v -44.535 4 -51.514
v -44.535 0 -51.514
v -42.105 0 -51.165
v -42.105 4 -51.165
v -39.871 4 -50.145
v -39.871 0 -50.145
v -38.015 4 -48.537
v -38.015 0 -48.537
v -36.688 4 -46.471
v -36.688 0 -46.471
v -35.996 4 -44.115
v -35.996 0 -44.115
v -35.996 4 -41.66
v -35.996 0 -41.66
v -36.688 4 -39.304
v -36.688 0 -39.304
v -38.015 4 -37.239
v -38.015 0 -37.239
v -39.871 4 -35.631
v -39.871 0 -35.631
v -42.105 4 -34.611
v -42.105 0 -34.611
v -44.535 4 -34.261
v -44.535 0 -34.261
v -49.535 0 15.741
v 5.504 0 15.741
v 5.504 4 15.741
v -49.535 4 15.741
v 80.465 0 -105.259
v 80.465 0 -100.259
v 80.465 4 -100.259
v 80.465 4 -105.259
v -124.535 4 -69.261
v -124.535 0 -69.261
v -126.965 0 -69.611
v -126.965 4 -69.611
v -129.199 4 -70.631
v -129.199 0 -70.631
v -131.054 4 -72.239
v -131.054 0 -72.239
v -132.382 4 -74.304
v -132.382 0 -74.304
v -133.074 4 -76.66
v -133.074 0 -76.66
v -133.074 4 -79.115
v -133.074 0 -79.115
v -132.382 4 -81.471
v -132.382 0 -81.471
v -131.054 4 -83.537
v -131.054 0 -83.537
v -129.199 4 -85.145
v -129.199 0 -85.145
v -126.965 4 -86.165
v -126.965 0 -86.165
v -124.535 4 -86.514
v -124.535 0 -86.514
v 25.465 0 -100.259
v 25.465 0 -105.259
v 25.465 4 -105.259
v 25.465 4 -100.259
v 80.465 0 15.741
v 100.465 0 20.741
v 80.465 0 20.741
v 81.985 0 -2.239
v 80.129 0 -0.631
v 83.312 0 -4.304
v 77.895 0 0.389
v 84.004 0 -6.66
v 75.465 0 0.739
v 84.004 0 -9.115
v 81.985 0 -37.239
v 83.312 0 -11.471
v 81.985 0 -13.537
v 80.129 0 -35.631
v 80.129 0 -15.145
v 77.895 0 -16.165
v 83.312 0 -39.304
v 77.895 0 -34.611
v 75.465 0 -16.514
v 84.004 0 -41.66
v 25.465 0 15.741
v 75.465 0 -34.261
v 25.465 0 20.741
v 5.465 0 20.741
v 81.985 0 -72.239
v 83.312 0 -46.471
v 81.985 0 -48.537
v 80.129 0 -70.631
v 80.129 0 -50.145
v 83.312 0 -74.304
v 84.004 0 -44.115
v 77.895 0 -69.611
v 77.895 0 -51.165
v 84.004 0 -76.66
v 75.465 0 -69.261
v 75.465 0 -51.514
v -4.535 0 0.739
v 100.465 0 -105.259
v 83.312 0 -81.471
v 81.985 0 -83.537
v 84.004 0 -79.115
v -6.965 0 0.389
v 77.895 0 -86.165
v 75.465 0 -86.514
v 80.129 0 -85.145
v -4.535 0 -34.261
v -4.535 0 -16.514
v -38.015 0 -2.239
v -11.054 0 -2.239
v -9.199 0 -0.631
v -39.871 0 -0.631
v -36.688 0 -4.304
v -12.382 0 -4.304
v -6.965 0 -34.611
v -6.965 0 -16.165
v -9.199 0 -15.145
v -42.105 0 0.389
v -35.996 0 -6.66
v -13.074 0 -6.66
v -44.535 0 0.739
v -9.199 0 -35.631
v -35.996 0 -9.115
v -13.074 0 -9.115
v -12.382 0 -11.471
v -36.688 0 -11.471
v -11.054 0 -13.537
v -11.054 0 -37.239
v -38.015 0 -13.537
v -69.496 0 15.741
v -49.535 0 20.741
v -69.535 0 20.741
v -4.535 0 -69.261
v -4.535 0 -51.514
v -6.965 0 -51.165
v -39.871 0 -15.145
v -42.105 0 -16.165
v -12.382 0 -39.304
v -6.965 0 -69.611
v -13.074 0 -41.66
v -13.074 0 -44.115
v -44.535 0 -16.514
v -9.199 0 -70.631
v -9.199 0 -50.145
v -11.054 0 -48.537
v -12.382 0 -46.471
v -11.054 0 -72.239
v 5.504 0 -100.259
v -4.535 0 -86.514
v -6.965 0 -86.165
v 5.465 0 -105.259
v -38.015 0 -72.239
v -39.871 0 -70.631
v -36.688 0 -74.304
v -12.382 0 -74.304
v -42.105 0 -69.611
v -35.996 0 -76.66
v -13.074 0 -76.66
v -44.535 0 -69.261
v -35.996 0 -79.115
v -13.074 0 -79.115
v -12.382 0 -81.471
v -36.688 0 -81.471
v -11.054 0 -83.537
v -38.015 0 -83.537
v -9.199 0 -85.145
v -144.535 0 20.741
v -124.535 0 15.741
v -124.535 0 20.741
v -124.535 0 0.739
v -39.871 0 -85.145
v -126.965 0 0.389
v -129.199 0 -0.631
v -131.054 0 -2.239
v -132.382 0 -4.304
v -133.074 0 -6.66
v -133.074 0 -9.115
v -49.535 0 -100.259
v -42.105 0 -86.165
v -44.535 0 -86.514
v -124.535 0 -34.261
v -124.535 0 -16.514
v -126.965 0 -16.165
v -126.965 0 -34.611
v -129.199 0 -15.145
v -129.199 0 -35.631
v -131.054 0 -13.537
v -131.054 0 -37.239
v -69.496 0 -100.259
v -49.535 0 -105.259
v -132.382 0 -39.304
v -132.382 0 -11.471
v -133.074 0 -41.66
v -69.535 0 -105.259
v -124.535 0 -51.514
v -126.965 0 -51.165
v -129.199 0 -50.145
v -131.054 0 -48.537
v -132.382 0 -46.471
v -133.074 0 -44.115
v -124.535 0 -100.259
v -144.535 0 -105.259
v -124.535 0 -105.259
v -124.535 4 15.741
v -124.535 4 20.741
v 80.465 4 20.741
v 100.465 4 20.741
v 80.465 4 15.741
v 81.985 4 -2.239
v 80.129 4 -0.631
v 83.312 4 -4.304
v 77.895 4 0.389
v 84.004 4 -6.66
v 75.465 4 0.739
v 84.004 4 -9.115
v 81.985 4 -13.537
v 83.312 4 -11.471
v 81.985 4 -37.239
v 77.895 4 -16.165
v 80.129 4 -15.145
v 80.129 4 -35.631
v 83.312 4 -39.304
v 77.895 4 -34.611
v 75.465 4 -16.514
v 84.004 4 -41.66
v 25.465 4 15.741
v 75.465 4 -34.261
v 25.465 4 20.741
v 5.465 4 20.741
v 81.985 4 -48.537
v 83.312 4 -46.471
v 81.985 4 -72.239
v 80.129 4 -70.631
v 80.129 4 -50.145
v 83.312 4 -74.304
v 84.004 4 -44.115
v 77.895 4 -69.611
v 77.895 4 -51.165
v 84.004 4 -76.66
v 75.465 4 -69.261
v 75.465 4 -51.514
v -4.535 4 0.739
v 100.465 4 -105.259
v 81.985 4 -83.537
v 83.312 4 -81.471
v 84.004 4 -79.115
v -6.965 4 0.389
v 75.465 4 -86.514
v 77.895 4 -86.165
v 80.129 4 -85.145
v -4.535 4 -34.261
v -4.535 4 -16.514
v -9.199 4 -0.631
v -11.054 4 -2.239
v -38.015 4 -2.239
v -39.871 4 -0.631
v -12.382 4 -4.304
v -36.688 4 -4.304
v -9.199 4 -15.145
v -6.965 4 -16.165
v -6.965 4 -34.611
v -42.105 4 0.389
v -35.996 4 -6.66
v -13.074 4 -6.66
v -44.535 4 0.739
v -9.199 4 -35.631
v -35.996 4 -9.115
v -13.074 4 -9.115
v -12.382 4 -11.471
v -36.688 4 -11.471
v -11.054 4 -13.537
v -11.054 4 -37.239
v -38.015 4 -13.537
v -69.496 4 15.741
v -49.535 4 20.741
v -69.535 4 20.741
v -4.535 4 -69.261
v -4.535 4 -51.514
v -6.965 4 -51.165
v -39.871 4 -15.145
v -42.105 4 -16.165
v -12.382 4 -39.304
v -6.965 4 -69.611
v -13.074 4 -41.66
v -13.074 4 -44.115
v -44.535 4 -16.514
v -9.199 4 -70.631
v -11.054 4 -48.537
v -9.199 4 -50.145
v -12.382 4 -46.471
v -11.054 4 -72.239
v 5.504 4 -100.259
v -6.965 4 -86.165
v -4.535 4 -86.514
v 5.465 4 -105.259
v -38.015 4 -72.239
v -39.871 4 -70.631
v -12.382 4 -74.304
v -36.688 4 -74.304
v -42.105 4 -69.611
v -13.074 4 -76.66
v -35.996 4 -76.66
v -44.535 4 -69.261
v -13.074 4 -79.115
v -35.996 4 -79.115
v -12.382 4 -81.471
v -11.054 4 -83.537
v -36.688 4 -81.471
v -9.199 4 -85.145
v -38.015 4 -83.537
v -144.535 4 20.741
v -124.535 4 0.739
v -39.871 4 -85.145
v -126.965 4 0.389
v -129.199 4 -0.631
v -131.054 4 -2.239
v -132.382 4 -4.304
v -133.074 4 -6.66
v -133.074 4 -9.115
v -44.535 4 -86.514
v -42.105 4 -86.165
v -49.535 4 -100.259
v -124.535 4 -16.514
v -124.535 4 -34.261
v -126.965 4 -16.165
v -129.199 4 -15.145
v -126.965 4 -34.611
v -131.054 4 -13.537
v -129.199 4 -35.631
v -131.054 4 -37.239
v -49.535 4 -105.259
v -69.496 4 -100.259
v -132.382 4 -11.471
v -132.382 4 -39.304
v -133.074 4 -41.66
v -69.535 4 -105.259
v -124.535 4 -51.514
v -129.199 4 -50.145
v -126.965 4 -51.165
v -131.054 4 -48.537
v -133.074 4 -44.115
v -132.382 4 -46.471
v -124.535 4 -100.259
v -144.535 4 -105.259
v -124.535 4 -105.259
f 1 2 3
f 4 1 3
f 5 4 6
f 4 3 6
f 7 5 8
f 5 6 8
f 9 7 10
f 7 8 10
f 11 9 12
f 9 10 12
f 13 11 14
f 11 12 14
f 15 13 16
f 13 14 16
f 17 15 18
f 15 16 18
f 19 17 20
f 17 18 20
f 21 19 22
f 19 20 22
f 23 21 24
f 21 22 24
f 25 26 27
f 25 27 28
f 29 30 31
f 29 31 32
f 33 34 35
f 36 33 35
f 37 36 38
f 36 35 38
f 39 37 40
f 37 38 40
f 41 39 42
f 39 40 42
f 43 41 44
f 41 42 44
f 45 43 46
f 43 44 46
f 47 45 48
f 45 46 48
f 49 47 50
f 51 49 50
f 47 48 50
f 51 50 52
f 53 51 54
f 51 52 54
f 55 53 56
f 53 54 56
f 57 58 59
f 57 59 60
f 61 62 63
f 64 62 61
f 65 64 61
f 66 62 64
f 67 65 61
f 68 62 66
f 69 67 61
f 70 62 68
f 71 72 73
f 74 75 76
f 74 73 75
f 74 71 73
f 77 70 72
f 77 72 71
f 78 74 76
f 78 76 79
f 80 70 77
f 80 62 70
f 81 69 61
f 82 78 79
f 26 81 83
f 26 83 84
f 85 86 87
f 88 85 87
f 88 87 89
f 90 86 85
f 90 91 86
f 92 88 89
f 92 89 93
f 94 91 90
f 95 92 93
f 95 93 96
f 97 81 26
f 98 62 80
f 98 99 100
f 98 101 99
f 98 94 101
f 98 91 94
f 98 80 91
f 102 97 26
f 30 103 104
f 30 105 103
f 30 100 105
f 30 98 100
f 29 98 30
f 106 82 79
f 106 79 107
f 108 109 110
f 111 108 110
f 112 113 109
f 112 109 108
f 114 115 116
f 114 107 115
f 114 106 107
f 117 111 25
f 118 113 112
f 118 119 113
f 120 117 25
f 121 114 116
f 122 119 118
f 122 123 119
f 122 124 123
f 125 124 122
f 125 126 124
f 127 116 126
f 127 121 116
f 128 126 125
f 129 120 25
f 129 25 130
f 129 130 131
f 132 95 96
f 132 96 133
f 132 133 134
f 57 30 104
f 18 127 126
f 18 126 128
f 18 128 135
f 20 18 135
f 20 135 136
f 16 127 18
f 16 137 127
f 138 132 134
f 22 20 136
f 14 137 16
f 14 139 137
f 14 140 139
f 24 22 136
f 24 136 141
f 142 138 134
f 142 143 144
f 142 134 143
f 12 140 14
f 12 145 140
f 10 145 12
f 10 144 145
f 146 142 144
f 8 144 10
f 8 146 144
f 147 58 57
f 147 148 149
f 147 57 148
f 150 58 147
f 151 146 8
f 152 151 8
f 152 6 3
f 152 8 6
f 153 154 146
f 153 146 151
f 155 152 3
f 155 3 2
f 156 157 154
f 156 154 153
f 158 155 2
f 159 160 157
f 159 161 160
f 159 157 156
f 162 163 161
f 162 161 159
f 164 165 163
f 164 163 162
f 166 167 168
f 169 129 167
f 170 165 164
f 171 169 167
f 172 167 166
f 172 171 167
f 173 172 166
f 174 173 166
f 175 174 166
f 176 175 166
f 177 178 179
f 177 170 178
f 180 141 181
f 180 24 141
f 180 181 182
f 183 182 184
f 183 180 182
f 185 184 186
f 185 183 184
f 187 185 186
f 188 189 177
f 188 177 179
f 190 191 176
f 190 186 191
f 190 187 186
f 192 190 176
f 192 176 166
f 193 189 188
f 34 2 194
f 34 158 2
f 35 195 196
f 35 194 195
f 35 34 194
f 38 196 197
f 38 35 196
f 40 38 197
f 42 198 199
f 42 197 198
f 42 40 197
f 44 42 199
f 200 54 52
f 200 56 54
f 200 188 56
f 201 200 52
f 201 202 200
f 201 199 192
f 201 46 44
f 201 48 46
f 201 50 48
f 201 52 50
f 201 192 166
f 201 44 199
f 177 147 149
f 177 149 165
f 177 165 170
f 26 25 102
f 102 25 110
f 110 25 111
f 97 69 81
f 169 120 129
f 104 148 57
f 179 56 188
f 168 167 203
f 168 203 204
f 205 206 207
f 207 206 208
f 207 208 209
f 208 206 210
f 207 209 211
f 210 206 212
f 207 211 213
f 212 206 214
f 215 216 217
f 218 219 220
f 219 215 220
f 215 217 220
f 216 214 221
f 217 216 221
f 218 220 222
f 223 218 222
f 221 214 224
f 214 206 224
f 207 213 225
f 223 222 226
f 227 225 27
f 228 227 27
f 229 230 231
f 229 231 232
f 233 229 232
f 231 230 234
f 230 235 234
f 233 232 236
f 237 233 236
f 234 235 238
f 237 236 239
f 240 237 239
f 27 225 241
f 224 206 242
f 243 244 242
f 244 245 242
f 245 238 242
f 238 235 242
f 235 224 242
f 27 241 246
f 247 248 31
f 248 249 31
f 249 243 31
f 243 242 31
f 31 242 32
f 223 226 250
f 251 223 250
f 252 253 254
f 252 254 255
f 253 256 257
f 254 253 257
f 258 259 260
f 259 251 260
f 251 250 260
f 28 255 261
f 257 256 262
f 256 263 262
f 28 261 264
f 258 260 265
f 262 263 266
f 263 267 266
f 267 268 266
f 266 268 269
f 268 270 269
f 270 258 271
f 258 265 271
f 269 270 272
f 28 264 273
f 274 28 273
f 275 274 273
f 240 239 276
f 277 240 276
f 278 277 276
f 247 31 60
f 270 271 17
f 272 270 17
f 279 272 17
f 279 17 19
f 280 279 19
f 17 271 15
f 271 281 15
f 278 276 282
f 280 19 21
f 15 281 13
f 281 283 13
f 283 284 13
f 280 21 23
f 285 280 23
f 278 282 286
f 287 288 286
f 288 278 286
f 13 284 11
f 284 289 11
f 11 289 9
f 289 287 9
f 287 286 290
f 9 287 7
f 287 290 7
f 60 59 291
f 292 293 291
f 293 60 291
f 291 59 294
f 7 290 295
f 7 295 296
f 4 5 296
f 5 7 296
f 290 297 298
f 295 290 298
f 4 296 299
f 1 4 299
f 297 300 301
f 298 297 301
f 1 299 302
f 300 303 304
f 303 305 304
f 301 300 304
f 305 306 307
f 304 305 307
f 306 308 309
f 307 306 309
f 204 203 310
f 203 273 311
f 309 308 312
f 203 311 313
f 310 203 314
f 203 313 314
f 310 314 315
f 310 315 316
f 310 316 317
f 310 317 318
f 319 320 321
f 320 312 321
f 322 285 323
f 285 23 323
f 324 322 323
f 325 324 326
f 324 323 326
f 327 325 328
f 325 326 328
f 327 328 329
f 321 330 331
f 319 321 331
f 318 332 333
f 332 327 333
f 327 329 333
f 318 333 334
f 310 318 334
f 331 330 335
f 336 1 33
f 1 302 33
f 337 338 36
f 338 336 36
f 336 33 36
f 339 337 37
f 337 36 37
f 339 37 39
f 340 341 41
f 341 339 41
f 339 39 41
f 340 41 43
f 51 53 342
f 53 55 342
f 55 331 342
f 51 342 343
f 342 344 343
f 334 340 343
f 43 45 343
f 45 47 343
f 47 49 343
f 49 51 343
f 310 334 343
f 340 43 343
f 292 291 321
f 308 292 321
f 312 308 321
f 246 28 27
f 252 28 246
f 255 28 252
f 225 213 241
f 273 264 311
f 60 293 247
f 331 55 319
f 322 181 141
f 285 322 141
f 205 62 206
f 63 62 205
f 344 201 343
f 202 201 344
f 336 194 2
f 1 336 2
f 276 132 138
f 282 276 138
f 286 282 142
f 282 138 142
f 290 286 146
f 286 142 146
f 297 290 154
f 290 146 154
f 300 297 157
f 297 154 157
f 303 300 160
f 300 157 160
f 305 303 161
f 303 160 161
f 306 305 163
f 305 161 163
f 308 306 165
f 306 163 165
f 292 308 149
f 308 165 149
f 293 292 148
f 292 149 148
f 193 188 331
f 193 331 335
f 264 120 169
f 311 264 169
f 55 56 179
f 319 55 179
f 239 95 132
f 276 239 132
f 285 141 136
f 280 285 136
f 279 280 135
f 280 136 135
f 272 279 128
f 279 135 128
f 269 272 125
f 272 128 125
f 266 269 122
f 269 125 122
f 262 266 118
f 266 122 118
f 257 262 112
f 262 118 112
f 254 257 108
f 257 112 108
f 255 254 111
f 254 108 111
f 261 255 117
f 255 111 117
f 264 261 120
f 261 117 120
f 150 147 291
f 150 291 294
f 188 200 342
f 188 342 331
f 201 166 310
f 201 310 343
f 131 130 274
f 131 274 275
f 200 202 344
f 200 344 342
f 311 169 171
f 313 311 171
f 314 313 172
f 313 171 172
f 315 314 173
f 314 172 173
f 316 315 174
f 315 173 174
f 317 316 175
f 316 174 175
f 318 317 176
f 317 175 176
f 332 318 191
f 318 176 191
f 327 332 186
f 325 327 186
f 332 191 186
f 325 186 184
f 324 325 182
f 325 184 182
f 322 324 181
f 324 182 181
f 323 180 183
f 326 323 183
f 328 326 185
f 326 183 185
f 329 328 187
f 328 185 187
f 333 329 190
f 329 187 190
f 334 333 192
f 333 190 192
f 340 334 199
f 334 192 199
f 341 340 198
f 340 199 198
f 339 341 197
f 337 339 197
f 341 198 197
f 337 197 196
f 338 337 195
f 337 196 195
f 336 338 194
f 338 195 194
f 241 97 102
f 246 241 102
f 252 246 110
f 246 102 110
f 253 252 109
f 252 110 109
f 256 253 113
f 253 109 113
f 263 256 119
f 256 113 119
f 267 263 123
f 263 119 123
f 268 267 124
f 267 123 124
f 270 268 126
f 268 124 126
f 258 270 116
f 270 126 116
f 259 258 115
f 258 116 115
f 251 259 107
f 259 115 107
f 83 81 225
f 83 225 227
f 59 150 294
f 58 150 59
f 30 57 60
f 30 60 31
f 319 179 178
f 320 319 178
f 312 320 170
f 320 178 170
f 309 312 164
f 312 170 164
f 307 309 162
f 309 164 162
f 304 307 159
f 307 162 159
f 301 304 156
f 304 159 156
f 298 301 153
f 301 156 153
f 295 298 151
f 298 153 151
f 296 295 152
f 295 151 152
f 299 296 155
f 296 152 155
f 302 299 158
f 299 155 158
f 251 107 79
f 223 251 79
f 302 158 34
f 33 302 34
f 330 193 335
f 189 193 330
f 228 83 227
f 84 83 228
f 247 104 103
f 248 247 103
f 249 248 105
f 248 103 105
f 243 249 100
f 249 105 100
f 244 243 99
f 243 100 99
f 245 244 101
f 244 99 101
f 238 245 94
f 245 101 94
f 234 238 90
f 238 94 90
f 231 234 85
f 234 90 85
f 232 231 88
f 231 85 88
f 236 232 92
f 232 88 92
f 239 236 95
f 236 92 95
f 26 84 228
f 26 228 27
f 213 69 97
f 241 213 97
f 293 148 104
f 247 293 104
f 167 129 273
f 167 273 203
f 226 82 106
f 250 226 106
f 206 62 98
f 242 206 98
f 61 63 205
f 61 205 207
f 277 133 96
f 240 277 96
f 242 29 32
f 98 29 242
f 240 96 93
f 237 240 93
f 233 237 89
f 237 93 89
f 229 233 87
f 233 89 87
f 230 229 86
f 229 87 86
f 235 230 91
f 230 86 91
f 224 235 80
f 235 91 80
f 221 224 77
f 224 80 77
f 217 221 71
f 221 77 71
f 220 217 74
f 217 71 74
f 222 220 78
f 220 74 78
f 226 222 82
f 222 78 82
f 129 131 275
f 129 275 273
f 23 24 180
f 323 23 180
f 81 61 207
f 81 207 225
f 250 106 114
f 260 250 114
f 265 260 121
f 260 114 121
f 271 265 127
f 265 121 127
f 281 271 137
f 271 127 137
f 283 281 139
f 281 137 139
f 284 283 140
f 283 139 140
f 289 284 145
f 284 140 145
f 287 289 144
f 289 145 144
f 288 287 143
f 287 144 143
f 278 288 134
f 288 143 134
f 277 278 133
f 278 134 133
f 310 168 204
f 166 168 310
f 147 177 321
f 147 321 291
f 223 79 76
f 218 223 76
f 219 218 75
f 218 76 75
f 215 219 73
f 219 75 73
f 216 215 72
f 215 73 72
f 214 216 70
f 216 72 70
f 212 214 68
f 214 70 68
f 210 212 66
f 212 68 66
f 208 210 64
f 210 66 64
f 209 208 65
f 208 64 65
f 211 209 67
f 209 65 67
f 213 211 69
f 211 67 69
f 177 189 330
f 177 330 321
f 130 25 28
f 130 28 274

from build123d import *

# Parameters (mm, degrees)
BOSS_EXTRUDE1_DEPTH = 4


with BuildPart() as part:
    # Sketch1 → Boss-Extrude1 (new body)
    with BuildSketch(Plane(origin=(0, 0, 0), x_dir=(1, 0, 0), z_dir=(0, 1, 0))):
        Polygon((-69.534910804, 105.258653628), (-49.534910804, 105.258653628), (-49.534910804, 100.258653628), (5.503649635, 100.258653628), (5.465089196, 105.258653628), (25.465089196, 105.258653628), (25.465089196, 100.258653628), (80.465089196, 100.258653628), (80.465089196, 105.258653628), (100.465089196, 105.258653628), (100.465089196, 100.258653628), (100.465089196, -15.741346372), (100.465089196, -20.741346372), (80.465089196, -20.741346372), (80.465089196, -15.741346372), (25.465089196, -15.741346372), (25.465089196, -20.741346372), (5.465089196, -20.741346372), (5.503649635, -15.741346372), (-49.534910804, -15.741346372), (-49.534910804, -20.741346372), (-69.534910804, -20.741346372), (-69.496350365, -15.741346372), (-124.534910804, -15.741346372), (-124.534910804, -20.741346372), (-144.534910804, -20.741346372), (-144.534910804, 105.258653628), (-124.534910804, 105.258653628), (-124.534910804, 100.258653628), (-69.496350365, 100.258653628), align=None)
        with BuildLine():
            Line((-4.534910804, 86.514295241), (75.465089196, 86.514295241))
            ThreePointArc((75.465089196, 86.514295241), (84.091672485, 77.887711952), (75.465089196, 69.261128664))
            Line((75.465089196, 69.261128664), (-4.534910804, 69.261128664))
            ThreePointArc((-4.534910804, 69.261128664), (-13.161494092, 77.887711952), (-4.534910804, 86.514295241))
        make_face(mode=Mode.SUBTRACT)
        with BuildLine():
            Line((-124.534910804, 86.514295241), (-44.534910804, 86.514295241))
            ThreePointArc((-44.534910804, 86.514295241), (-35.908327515, 77.887711952), (-44.534910804, 69.261128664))
            Line((-44.534910804, 69.261128664), (-124.534910804, 69.261128664))
            ThreePointArc((-124.534910804, 69.261128664), (-133.161494092, 77.887711952), (-124.534910804, 86.514295241))
        make_face(mode=Mode.SUBTRACT)
        with BuildLine():
            Line((-4.534910804, 51.514295241), (75.465089196, 51.514295241))
            ThreePointArc((75.465089196, 51.514295241), (84.091672485, 42.887711952), (75.465089196, 34.261128664))
            Line((75.465089196, 34.261128664), (-4.534910804, 34.261128664))
            ThreePointArc((-4.534910804, 34.261128664), (-13.161494092, 42.887711952), (-4.534910804, 51.514295241))
        make_face(mode=Mode.SUBTRACT)
        with BuildLine():
            Line((-4.534910804, 16.514295241), (75.465089196, 16.514295241))
            ThreePointArc((75.465089196, 16.514295241), (84.091672485, 7.887711952), (75.465089196, -0.738871336))
            Line((75.465089196, -0.738871336), (-4.534910804, -0.738871336))
            ThreePointArc((-4.534910804, -0.738871336), (-13.161494092, 7.887711952), (-4.534910804, 16.514295241))
        make_face(mode=Mode.SUBTRACT)
        with BuildLine():
            Line((-124.534910804, 51.514295241), (-44.534910804, 51.514295241))
            ThreePointArc((-44.534910804, 51.514295241), (-35.908327515, 42.887711952), (-44.534910804, 34.261128664))
            Line((-44.534910804, 34.261128664), (-124.534910804, 34.261128664))
            ThreePointArc((-124.534910804, 34.261128664), (-133.161494092, 42.887711952), (-124.534910804, 51.514295241))
        make_face(mode=Mode.SUBTRACT)
        with BuildLine():
            Line((-124.534910804, 16.514295241), (-44.534910804, 16.514295241))
            ThreePointArc((-44.534910804, 16.514295241), (-35.908327515, 7.887711952), (-44.534910804, -0.738871336))
            Line((-44.534910804, -0.738871336), (-124.534910804, -0.738871336))
            ThreePointArc((-124.534910804, -0.738871336), (-133.161494092, 7.887711952), (-124.534910804, 16.514295241))
        make_face(mode=Mode.SUBTRACT)
    extrude(amount=BOSS_EXTRUDE1_DEPTH)


solid = part.part
